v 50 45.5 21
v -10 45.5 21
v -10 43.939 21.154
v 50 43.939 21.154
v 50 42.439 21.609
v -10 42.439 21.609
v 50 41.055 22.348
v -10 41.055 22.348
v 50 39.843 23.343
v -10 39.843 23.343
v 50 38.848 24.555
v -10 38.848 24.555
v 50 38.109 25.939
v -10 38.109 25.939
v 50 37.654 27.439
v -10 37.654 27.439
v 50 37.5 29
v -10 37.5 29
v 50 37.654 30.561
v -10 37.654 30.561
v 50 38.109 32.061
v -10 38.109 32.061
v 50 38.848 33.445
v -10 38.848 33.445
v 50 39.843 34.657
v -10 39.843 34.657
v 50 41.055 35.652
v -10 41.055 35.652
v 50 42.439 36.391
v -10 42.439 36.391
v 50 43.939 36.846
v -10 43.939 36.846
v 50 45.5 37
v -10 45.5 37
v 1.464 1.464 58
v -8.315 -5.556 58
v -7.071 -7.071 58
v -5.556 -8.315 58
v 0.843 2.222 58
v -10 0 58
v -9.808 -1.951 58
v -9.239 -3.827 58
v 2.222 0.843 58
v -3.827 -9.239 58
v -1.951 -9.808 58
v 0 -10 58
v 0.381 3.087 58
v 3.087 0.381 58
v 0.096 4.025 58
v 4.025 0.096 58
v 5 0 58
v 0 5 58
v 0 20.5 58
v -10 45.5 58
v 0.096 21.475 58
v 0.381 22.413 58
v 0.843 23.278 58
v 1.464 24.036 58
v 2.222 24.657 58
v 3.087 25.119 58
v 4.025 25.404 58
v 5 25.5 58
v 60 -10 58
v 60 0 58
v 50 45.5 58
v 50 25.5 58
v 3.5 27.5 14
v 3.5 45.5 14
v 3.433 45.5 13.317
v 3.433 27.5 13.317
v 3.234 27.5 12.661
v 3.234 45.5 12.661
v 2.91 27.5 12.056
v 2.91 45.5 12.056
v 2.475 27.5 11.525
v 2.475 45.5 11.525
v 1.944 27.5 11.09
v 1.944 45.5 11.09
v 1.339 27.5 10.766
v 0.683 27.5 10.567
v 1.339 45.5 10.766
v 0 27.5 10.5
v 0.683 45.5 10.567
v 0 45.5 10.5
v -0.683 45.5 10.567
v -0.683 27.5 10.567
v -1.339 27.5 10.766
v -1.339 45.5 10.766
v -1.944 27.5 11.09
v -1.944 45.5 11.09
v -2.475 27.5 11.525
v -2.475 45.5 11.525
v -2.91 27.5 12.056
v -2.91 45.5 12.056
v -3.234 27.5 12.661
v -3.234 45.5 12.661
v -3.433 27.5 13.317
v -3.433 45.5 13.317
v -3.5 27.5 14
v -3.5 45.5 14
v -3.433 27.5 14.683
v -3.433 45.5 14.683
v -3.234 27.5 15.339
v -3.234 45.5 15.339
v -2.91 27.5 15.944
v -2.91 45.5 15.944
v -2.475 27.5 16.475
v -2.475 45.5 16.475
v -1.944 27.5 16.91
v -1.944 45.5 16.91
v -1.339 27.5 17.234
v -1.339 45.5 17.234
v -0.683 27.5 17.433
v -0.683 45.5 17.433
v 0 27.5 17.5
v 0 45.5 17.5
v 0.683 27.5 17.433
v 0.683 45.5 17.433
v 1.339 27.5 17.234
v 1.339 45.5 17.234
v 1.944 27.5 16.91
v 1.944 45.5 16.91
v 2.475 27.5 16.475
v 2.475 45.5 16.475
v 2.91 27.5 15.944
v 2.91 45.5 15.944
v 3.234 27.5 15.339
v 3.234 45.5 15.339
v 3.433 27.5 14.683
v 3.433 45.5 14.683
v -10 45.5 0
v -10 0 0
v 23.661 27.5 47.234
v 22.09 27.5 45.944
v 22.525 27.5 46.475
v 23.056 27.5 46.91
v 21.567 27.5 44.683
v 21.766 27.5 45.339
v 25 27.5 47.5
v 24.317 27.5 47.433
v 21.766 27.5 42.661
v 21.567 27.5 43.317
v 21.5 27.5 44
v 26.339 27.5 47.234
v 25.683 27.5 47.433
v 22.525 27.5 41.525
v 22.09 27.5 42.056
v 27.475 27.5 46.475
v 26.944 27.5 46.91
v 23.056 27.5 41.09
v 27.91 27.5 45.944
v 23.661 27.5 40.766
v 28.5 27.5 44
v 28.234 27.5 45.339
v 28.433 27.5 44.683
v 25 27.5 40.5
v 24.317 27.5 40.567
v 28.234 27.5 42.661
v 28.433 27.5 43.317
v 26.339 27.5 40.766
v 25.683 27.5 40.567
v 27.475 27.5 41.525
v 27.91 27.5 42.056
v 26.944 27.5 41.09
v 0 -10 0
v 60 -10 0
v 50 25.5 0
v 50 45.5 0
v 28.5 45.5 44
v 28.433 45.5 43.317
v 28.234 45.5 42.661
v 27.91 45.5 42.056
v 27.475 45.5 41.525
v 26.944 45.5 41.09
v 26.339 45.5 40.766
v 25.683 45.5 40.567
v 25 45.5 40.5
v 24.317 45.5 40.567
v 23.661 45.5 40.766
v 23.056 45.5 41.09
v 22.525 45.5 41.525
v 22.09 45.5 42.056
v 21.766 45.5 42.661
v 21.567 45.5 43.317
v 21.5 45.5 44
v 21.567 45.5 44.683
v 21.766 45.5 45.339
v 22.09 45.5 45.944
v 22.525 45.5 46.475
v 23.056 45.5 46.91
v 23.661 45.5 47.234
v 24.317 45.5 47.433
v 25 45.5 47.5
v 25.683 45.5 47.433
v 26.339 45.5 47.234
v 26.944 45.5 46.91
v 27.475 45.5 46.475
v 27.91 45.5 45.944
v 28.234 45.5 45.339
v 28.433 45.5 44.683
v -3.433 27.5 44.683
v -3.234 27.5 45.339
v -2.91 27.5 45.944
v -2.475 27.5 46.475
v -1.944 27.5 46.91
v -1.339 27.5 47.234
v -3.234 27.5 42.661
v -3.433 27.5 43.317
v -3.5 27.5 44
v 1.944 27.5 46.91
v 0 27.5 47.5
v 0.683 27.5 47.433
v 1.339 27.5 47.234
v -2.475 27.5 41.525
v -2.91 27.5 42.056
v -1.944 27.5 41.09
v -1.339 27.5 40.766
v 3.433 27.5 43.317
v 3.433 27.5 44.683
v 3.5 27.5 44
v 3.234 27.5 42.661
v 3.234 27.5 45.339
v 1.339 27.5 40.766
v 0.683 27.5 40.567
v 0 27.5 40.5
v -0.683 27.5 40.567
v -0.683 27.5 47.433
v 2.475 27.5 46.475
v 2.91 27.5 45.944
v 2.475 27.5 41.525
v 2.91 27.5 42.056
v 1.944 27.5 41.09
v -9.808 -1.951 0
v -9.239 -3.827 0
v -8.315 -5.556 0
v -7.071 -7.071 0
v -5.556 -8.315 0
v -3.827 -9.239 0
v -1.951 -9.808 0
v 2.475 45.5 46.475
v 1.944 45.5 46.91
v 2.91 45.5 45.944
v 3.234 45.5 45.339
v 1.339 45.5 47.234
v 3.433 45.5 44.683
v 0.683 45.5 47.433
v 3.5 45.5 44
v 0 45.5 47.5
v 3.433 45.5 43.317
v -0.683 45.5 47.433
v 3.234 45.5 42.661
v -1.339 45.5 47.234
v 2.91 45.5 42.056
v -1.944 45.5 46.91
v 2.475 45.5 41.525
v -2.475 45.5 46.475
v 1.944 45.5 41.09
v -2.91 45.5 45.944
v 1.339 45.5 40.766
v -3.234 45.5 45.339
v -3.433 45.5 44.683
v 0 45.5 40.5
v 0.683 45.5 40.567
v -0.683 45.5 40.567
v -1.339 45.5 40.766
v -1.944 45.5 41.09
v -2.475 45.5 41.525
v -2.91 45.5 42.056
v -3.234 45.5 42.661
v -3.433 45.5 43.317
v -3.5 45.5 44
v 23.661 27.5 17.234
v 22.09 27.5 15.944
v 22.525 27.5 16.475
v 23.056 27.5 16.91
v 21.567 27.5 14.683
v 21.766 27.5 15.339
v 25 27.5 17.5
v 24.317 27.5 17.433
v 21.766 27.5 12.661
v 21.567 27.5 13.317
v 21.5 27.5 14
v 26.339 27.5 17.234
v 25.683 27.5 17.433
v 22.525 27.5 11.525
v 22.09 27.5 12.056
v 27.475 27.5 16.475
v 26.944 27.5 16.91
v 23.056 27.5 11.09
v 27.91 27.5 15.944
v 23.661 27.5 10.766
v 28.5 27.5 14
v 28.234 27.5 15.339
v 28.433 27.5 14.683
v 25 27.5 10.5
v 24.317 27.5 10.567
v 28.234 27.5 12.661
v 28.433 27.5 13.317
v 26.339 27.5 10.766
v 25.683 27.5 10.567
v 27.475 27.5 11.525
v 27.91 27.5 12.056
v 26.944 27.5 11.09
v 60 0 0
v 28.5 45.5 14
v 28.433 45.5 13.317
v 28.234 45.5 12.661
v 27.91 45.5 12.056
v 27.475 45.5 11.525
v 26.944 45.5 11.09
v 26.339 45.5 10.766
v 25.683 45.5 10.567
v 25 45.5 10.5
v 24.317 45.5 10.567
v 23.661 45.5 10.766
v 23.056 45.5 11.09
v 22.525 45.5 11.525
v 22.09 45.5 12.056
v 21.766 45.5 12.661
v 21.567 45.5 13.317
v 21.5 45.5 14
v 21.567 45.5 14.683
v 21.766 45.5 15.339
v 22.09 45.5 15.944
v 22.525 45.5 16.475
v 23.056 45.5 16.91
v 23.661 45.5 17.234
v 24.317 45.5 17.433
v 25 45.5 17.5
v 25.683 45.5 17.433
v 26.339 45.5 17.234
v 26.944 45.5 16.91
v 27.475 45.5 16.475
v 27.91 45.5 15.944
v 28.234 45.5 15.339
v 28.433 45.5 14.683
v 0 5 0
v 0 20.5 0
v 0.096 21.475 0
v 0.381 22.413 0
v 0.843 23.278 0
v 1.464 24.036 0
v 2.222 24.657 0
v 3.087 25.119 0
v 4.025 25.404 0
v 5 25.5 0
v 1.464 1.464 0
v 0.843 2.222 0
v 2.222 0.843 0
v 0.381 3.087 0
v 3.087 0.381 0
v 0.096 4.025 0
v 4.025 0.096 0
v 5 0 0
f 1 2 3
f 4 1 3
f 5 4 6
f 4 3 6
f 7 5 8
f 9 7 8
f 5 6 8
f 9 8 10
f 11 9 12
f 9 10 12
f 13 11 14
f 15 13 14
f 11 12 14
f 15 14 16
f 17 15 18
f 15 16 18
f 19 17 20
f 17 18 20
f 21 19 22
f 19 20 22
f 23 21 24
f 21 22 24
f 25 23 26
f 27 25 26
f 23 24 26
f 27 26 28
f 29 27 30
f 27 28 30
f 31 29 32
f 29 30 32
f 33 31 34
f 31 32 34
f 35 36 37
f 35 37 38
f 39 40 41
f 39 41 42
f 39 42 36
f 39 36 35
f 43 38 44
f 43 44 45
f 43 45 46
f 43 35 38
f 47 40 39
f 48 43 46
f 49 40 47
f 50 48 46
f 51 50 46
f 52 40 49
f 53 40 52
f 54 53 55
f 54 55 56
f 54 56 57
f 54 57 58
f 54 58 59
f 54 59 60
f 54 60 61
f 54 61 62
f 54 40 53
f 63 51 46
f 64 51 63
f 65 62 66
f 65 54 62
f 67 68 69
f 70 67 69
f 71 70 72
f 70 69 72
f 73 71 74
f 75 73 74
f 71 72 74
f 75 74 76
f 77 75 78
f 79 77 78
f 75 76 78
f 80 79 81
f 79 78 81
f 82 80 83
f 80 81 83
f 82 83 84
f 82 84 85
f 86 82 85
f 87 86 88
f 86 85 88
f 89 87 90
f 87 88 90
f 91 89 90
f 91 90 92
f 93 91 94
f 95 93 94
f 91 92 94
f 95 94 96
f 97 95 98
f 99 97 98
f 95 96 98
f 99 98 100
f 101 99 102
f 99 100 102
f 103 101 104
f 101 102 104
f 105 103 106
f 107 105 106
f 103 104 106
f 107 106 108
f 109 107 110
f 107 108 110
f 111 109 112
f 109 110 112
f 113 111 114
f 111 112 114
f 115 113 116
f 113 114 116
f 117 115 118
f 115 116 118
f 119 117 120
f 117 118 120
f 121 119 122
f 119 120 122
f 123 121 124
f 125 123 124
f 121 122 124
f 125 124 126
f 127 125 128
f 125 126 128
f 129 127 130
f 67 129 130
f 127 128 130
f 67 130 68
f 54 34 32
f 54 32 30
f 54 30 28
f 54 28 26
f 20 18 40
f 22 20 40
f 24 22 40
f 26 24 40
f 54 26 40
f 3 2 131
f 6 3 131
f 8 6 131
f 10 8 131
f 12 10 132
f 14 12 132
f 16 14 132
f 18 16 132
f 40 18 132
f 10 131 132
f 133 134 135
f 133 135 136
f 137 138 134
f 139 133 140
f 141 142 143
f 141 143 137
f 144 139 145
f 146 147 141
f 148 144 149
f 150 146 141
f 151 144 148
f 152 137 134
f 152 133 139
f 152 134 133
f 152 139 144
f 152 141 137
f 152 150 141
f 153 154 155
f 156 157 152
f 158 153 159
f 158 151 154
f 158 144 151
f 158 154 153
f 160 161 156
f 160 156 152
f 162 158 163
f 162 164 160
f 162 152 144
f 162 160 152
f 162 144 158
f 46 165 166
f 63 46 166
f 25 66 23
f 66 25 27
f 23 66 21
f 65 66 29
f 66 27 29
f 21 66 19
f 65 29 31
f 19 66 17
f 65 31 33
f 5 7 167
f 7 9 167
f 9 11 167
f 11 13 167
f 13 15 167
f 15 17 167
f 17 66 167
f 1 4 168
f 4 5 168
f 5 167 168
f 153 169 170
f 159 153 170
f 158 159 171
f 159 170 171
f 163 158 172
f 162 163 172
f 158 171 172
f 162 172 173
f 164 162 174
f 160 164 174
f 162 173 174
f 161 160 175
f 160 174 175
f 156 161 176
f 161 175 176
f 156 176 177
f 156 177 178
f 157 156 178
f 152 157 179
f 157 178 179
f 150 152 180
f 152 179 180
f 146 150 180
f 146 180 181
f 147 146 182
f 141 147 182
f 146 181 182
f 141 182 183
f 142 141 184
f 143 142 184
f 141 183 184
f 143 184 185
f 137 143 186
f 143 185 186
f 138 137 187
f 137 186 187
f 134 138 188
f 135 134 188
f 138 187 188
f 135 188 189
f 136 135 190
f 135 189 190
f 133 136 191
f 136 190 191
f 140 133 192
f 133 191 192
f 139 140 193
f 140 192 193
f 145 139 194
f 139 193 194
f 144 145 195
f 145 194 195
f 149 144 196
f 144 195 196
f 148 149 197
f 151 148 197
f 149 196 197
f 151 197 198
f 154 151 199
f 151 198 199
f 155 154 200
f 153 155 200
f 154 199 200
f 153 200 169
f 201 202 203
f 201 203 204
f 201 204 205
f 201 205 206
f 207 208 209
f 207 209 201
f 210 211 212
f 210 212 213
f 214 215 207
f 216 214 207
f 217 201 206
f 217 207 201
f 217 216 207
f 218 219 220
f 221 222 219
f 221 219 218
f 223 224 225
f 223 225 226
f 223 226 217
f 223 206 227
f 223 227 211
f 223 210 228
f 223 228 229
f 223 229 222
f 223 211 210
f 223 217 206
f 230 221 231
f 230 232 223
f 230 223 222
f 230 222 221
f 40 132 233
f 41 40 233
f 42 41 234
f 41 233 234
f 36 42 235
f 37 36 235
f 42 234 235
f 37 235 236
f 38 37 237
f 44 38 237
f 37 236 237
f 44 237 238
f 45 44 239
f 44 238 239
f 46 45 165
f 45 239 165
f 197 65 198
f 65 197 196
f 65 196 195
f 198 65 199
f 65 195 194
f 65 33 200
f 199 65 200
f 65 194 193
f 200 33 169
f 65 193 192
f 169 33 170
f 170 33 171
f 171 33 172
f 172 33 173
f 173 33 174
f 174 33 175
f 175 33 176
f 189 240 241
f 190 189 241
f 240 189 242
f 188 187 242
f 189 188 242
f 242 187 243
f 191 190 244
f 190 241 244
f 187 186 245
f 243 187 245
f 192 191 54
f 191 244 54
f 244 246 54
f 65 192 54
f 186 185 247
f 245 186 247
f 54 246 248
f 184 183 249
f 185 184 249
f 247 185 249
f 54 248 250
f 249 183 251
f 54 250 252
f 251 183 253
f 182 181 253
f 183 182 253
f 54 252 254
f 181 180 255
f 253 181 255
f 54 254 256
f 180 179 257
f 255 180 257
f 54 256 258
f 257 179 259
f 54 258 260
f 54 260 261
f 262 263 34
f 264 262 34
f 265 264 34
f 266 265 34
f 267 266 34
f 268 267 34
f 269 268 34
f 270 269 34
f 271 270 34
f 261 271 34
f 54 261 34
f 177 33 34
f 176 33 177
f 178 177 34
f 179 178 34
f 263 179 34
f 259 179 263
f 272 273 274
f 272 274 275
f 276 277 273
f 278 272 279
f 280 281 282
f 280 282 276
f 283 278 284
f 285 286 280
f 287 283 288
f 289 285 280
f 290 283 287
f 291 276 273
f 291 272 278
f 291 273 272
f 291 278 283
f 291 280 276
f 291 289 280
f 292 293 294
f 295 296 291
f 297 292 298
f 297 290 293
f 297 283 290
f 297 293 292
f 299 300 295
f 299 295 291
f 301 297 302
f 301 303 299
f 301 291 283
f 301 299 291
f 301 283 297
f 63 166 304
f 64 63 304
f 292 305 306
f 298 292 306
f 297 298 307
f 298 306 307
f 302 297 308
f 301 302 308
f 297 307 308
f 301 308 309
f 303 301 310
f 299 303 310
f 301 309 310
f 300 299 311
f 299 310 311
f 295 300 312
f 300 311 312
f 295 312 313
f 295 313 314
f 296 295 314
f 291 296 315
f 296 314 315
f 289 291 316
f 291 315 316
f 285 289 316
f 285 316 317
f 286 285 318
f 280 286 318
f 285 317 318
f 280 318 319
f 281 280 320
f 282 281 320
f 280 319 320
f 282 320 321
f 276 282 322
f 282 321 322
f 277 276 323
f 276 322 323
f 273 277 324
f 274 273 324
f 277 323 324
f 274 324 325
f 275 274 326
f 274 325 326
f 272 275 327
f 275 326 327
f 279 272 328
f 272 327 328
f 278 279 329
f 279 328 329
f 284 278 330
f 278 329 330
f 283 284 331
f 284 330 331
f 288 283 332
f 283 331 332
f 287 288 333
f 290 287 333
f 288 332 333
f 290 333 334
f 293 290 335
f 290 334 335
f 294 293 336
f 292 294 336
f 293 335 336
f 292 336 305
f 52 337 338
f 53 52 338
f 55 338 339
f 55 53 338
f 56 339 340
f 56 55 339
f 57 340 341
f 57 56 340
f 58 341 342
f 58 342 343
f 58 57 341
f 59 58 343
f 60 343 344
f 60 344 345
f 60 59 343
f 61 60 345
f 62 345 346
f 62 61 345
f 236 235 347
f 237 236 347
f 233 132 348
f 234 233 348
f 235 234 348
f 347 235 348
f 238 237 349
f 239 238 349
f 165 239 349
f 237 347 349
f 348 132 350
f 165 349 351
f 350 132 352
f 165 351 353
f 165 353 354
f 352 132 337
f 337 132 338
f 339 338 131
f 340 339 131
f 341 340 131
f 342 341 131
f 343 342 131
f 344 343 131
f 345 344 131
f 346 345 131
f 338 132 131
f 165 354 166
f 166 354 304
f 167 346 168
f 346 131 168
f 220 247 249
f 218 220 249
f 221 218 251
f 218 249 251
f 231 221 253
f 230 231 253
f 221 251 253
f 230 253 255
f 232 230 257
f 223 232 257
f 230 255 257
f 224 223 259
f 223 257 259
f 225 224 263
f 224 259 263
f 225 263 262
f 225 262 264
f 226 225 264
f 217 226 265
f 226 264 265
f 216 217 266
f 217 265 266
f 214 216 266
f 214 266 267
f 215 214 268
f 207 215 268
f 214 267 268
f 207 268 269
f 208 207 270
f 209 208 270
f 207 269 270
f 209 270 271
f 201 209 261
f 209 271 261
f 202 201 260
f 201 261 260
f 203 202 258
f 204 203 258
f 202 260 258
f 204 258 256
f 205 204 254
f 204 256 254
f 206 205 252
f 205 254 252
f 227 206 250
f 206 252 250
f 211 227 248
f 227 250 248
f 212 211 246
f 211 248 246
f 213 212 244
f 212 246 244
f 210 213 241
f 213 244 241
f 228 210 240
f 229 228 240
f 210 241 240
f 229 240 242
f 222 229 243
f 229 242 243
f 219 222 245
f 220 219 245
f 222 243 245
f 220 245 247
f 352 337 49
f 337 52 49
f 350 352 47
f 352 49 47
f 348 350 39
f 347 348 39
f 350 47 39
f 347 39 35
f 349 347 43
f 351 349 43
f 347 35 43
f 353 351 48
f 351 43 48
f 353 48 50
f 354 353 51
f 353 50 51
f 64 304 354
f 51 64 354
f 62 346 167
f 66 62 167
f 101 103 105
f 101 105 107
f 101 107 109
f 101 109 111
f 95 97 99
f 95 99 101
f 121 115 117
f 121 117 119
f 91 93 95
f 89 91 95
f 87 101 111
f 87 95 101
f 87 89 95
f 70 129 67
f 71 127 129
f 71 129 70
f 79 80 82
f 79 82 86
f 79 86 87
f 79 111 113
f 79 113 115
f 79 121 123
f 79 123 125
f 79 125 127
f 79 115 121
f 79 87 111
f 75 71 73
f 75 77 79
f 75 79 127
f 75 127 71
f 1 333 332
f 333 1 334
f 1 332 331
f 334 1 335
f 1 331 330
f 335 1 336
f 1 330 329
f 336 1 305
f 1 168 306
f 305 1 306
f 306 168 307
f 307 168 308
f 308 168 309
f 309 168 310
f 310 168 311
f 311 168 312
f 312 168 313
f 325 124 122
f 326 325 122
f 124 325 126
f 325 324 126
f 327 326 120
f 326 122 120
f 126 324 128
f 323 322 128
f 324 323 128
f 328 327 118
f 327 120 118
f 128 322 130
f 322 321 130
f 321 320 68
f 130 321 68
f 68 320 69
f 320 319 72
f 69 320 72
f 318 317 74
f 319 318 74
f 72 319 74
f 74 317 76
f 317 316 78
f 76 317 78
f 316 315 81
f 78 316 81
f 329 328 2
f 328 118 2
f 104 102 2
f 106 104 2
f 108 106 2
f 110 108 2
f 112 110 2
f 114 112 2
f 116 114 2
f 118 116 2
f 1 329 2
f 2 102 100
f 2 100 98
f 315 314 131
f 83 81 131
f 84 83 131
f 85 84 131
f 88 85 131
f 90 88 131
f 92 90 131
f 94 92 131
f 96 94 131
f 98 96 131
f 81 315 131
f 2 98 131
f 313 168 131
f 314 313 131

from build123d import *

# Parameters (mm, degrees)
BOSS_EXTRUDE1_DEPTH = 58
SKETCH2_R           = 8
CUT_EXTRUDE1_DEPTH  = 60
SKETCH3_R           = 3.5
CUT_EXTRUDE2_DEPTH  = 18
FILLET1_R           = 5


with BuildPart() as part:
    # Sketch1 → Boss-Extrude1 (new body)
    with BuildSketch(Plane.XY):
        with BuildLine():
            Line((0, 0), (0, 25.5))
            Line((0, 25.5), (50, 25.5))
            Line((50, 25.5), (50, 45.5))
            Line((50, 45.5), (-10, 45.5))
            Line((-10, 45.5), (-10, 0))
            ThreePointArc((-10, 0), (-7.071067812, -7.071067812), (0, -10))
            Line((0, -10), (60, -10))
            Line((60, -10), (60, 0))
            Line((60, 0), (0, 0))
        make_face()
    extrude(amount=BOSS_EXTRUDE1_DEPTH)

    # Sketch2 → Cut-Extrude1 (cut)
    with BuildSketch(Plane.ZY.offset(10)):
        with Locations((29, 45.5)):
            Circle(SKETCH2_R)
    extrude(amount=-CUT_EXTRUDE1_DEPTH, mode=Mode.SUBTRACT)

    # Sketch3 → Cut-Extrude2 (cut)
    with BuildSketch(Plane(origin=(0, 45.5, 0), x_dir=(1, 0, 0), z_dir=(0, 1, 0))):
        with Locations((0, -14)):
            Circle(SKETCH3_R)
        with Locations((0, -44)):
            Circle(SKETCH3_R)
        with Locations((25, -14)):
            Circle(SKETCH3_R)
        with Locations((25, -44)):
            Circle(SKETCH3_R)
    extrude(amount=-CUT_EXTRUDE2_DEPTH, mode=Mode.SUBTRACT)

    # Fillet1
    fillet1_edges = [part.edges().sort_by_distance(p)[0] for p in [
        (0, 25.5, 29),
        (0, 0, 29),
    ]]
    fillet(fillet1_edges, radius=FILLET1_R)


solid = part.part
